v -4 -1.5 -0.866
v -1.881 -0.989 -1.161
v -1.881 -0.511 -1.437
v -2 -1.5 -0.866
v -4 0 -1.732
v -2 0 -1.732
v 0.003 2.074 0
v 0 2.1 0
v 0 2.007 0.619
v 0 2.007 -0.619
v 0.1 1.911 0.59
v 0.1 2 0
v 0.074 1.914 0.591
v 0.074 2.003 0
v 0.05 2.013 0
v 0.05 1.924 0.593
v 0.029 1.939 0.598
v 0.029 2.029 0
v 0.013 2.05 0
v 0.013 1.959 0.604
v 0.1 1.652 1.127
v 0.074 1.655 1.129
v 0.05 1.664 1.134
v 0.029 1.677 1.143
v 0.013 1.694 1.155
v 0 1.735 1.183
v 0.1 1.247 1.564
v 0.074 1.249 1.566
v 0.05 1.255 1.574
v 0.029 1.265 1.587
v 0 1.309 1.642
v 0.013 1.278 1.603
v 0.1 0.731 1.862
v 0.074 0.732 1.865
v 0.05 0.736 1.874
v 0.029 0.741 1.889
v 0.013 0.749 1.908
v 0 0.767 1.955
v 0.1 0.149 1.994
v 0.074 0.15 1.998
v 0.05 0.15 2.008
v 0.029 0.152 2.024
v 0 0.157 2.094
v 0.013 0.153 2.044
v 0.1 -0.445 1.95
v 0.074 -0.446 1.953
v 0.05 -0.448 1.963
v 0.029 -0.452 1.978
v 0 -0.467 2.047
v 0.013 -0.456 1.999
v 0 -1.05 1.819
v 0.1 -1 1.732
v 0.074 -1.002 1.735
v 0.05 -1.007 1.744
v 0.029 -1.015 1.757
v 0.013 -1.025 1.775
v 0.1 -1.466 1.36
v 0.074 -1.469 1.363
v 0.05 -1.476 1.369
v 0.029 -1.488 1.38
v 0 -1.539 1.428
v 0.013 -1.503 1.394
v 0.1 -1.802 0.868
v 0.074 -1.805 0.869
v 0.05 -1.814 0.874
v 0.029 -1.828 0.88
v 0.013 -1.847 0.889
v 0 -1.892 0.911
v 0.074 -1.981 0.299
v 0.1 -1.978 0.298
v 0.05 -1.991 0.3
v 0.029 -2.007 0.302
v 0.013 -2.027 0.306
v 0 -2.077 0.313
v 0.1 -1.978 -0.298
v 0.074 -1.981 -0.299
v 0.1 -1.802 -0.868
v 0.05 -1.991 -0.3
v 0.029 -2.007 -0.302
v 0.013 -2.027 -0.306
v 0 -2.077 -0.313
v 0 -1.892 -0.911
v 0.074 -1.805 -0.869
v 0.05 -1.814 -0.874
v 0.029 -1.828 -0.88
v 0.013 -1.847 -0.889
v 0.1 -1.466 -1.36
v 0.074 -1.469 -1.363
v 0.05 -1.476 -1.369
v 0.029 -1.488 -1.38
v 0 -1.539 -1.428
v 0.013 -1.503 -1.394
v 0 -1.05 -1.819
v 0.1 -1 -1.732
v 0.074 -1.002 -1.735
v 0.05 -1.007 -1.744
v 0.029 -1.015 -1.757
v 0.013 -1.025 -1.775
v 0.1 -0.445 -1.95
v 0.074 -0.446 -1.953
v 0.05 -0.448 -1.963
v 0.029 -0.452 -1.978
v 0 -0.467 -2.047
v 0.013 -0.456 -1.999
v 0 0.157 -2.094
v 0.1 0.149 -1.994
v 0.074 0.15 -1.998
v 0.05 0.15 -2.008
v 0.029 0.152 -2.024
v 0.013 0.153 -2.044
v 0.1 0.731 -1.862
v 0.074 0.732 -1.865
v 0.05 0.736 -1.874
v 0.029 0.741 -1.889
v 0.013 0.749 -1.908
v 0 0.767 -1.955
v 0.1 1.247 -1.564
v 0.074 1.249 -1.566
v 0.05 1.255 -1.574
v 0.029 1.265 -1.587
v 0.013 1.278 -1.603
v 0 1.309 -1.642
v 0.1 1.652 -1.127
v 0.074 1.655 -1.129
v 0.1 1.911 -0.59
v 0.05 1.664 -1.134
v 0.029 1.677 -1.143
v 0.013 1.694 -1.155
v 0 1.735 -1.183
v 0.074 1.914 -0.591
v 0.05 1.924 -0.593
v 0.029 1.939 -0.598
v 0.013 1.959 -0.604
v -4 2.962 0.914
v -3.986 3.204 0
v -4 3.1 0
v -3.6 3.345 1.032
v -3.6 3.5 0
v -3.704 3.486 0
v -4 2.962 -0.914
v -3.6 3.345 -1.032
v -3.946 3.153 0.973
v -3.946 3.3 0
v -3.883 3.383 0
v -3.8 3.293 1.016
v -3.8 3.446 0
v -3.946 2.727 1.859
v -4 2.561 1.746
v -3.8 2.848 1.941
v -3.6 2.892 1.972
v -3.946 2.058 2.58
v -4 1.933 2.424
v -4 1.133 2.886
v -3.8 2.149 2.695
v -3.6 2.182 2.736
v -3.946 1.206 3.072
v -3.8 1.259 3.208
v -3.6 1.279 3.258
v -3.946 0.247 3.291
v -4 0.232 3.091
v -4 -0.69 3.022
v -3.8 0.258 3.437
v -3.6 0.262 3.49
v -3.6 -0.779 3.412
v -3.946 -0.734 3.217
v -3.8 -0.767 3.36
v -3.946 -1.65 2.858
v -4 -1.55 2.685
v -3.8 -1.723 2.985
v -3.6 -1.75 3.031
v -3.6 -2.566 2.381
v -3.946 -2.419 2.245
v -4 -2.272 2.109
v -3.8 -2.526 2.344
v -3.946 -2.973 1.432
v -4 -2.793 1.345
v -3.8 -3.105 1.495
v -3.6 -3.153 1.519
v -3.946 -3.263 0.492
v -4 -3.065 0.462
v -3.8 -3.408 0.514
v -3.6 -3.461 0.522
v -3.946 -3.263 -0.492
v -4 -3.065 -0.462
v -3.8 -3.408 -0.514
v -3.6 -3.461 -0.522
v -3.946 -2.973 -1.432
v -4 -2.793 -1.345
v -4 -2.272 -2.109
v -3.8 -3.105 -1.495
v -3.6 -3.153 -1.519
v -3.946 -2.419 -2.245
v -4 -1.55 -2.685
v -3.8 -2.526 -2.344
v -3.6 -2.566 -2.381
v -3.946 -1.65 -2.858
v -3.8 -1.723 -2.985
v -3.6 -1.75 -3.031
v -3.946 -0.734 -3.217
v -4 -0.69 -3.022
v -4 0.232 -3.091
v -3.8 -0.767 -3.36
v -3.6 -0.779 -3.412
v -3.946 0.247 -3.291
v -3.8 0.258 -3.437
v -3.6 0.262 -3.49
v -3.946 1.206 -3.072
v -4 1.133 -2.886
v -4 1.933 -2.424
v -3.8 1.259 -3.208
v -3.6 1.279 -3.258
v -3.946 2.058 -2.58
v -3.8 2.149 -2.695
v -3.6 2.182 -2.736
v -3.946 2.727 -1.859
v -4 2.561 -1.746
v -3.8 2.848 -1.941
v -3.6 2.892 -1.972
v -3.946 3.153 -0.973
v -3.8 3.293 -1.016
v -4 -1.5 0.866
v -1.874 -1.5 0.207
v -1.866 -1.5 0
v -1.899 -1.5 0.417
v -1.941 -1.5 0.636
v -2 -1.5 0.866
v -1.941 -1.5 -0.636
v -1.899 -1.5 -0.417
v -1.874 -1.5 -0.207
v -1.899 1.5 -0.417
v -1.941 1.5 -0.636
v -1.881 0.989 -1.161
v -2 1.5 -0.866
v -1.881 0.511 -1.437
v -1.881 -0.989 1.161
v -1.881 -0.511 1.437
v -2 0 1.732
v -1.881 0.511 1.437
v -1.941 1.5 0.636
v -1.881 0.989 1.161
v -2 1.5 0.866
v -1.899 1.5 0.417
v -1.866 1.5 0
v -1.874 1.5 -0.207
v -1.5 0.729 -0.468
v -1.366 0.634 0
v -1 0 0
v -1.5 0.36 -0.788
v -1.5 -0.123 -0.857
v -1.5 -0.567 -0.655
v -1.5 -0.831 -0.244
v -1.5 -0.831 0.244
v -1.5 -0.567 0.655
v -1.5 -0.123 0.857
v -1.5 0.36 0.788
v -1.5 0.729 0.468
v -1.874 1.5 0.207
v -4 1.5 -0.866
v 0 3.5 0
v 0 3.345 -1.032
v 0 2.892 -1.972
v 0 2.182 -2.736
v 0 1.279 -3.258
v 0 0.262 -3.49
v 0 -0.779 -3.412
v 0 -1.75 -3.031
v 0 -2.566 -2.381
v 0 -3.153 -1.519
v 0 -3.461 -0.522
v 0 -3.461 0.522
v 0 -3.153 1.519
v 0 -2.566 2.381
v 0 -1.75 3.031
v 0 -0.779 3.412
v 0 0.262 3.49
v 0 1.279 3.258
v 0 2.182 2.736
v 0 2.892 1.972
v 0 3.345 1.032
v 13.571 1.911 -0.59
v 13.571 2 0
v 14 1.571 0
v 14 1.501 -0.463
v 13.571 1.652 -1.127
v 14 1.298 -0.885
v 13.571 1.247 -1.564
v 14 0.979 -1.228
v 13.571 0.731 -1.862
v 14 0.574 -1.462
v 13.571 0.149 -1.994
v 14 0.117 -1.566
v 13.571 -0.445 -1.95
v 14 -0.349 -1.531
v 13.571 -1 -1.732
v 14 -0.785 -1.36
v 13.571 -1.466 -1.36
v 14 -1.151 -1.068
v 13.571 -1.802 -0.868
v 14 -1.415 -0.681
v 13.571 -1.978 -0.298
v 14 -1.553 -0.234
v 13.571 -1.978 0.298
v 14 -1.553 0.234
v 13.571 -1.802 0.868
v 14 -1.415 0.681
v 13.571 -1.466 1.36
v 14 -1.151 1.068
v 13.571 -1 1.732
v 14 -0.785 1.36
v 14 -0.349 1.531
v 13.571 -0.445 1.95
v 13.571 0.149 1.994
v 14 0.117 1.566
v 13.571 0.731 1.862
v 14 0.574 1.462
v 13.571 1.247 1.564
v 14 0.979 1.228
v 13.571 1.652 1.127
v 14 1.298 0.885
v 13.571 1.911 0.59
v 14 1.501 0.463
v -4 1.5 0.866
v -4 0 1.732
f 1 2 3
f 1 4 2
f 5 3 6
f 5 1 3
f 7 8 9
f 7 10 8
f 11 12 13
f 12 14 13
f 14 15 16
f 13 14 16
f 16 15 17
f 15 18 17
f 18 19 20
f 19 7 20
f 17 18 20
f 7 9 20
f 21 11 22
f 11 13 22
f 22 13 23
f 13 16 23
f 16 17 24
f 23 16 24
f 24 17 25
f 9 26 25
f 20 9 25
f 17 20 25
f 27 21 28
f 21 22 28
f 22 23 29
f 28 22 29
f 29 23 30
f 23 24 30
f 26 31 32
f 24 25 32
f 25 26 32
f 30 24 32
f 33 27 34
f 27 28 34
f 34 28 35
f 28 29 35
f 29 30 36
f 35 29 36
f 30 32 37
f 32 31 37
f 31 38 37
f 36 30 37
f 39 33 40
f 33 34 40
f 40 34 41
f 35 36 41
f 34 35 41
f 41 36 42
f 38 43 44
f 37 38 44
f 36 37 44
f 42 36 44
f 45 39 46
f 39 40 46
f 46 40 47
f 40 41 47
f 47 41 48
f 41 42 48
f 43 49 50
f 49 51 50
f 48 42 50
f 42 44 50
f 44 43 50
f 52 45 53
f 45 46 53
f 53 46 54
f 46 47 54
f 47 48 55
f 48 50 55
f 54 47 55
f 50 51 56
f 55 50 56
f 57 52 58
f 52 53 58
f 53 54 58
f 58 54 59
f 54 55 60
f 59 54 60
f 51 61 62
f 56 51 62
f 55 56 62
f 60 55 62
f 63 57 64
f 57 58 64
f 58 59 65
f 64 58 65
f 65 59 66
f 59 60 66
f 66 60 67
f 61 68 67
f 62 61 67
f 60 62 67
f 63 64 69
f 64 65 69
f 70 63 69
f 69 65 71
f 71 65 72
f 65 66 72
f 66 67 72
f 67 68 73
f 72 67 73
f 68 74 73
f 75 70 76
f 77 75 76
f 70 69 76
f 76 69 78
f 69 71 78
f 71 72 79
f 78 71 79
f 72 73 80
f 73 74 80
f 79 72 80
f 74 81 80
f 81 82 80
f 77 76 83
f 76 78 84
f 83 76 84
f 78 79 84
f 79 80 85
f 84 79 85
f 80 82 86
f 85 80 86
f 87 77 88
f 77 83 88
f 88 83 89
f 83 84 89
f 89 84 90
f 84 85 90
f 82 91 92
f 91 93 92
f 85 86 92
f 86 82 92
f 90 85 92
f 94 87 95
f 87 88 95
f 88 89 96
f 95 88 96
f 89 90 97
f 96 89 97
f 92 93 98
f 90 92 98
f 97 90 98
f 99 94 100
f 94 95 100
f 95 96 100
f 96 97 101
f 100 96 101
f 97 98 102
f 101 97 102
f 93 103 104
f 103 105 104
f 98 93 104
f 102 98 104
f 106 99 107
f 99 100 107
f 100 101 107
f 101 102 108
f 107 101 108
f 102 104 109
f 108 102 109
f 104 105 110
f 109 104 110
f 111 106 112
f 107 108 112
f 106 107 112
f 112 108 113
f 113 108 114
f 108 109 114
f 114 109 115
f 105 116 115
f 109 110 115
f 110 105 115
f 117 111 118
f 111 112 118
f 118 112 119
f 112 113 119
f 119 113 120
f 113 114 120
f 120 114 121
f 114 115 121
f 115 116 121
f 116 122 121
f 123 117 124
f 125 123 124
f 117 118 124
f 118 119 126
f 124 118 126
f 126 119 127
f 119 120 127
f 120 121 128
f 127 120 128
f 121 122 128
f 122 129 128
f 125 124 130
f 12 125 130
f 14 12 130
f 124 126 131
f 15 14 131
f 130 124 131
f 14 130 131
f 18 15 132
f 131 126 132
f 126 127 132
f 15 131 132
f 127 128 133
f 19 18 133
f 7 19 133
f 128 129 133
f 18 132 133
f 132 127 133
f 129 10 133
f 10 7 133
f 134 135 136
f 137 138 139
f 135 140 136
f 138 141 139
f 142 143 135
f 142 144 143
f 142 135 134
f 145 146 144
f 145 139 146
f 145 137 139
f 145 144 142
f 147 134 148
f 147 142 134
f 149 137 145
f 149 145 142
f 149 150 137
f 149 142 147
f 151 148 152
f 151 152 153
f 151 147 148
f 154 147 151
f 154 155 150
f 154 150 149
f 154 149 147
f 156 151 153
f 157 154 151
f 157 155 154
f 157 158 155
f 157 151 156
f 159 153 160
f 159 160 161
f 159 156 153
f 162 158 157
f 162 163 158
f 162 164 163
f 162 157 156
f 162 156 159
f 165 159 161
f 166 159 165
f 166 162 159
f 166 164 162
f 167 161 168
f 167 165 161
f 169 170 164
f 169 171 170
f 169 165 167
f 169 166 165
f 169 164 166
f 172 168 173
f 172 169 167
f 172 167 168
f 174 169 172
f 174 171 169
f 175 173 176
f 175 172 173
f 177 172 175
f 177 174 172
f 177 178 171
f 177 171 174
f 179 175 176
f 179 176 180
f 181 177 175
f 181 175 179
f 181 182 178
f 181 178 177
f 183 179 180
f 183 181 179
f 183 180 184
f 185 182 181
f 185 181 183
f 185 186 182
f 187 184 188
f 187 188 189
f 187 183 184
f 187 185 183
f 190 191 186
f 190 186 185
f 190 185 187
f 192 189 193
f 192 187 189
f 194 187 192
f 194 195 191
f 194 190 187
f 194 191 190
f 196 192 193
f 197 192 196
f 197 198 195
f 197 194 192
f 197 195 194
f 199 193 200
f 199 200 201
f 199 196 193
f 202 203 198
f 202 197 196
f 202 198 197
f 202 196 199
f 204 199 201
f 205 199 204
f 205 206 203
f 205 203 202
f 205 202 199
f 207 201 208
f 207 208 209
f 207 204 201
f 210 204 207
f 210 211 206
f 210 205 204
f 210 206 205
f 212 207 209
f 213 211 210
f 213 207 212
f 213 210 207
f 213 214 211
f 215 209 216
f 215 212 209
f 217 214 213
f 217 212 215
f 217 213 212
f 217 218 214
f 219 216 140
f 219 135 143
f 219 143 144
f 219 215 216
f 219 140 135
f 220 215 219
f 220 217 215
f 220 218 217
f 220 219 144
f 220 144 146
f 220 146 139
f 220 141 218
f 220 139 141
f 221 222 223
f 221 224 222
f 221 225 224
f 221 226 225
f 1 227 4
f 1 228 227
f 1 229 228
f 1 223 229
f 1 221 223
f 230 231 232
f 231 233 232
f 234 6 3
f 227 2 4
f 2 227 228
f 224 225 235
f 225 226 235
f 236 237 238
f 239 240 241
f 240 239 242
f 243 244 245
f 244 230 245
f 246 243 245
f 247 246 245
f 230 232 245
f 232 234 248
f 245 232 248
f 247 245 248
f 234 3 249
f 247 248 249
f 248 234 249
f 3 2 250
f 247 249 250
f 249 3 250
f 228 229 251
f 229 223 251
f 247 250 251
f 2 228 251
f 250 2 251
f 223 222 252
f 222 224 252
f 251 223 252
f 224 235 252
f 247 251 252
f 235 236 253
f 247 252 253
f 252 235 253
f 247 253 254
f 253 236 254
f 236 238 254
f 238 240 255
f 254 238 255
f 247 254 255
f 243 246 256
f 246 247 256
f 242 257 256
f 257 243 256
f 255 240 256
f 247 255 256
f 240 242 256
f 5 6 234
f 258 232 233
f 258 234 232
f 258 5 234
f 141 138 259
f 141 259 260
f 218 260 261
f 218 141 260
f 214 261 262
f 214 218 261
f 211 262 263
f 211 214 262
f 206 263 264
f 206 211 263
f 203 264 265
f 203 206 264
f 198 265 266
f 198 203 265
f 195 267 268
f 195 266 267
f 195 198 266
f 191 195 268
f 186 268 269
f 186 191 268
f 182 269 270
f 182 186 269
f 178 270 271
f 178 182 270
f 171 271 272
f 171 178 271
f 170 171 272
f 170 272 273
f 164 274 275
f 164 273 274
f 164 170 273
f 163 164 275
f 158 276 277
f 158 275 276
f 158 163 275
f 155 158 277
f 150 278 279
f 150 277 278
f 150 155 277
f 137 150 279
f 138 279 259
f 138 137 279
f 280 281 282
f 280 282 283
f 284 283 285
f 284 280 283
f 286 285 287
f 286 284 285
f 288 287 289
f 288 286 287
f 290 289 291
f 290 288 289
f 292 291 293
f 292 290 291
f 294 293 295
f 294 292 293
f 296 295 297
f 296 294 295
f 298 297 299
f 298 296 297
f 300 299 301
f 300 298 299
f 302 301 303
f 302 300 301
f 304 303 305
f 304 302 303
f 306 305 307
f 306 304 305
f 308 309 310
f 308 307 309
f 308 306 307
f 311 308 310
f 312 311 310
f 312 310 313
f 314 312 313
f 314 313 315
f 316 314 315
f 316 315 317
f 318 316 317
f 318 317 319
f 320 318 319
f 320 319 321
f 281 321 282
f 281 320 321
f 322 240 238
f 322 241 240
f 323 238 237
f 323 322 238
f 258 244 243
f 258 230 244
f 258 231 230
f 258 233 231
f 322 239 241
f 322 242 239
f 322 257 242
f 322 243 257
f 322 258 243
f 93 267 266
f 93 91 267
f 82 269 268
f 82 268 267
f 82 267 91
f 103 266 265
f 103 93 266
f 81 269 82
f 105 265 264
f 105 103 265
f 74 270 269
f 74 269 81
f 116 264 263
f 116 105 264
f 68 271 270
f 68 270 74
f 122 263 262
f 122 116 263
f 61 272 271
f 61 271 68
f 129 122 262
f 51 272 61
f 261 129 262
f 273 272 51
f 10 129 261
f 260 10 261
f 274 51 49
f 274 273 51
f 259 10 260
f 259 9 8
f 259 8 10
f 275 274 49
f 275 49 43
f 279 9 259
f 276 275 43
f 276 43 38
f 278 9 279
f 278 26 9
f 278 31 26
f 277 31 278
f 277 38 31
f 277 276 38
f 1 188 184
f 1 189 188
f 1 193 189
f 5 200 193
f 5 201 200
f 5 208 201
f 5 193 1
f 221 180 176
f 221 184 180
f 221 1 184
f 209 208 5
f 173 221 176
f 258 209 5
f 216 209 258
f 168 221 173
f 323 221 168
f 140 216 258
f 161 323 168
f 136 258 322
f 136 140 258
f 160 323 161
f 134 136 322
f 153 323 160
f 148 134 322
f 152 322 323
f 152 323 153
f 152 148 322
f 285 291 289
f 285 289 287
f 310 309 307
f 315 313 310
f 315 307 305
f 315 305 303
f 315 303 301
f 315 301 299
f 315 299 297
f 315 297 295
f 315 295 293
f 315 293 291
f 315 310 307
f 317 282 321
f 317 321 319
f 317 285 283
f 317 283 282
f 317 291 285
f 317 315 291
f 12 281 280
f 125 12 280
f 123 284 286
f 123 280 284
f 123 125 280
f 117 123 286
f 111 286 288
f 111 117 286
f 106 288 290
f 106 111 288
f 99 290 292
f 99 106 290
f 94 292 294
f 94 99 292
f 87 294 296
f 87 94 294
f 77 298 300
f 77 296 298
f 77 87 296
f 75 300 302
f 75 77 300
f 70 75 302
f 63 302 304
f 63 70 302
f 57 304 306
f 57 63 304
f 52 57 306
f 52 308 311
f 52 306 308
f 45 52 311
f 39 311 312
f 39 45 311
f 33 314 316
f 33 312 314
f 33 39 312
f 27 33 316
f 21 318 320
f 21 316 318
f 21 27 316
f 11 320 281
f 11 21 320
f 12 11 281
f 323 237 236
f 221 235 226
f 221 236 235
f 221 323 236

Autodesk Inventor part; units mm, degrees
ref_plane "YZ Plane" through (0, 0, 0) normal (1, 0, 0) x (0, 1, 0)
ref_plane "XZ Plane" through (0, 0, 0) normal (0, 1, 0) x (-1, 0, 0)
sketch "Sketch1" plane through (0, 0, 0) normal (0, 0, 1) x (1, 0, 0)
  line L0 (-1, 0) -> (14, 0)
  line L1 (14, 0) -> (14, 2)
  line L2 (14, 2) -> (1.75, 2)
  line L3 (1.75, 2) -> (1.3205, 2)
  line L4 (1.3205, 2) -> (0, 2)
  line L5 (0, 2) -> (0, 3.5)
  line L6 (0, 3.5) -> (-4, 3.5)
  line L7 (-4, 3.5) -> (-4, 1.7321)
  line L8 (-4, 1.7321) -> (-2, 1.7321)
  line L9 (-2, 1.7321) -> (-1, 0)
  line L10 (-7.6, 0) -> (17.6, 0) projected
  line L11 (0, -0.7) -> (0, 4.2) projected
  line L12 (1.75, 2) -> (0, 2) construction
  dimension "d1" = 12.25
  dimension "d2" = 0.4295
  dimension "d3" = 4
  dimension "d4" = 2
  dimension "d5" = 60
  dimension "d6" = 4
  dimension "d7" = 4
  dimension "d8" = 3.4641
  dimension "d9" = 7
  dimension "d26" = 14
revolve "Body" add sketch "Sketch1" angle 360 about axis through (-1, 0, 0) along (1, 0, 0)
sketch "Sketch2" plane through (-4, 0, 0) normal (-1, 0, 0) x (0, 0, 1)
  circle A0 centre (0, 0) radius 1.7321 projected
  line L0 (0, -4.9) -> (0, 4.9) projected
  line L1 (-4.9, 0) -> (4.9, 0) projected
  line L2 (1.7321, 0) -> (0.866, -1.5)
  line L3 (0.866, -1.5) -> (-0.866, -1.5)
  line L4 (-0.866, -1.5) -> (-1.7321, 0)
  line L5 (-1.7321, 0) -> (-0.866, 1.5)
  line L6 (-0.866, 1.5) -> (0.866, 1.5)
  line L7 (0.866, 1.5) -> (1.7321, 0)
extrude "Slot" add sketch "Sketch2" against normal up to next contours L7 A0 | A0 L2 | L6 L0 A0 | A0 L0 L3 | L0 L6 A0 | A0 L3 L0 | L4 A0 | A0 L5
fillet "Fillet1" radius 0.4 1 edges at (-4, -3.5, 0)
thread "Thread" size "M4x0.7" class "6g" standard "ISO Metric profile" length 12.25
chamfer "Chamfer1" distance 0.4294 distance2 0.4294 1 edges at (14, -2, 0) measured on face at (14, 0.527, -0.2661)
ref_plane "Work Plane1" through (29, 0, 0) normal (0, -1, 0) x (1, 0, 0)
fillet "Fillet2" radius 0.1 1 edges at (0, -2, 0)
equation "\"d1\" = GEL"
equation "\"d3\" = KOH"
equation "\"d4\" = INTI"
equation "\"d6\" = GD"
equation "\"d7\" = BDM"
equation "\"d8\" = 1.1547 * SW"
equation "\"d9\" = KOD"
equation "\"d26\" = NLG"
equation "\"d30\" = R"
equation "\"d17\" = RR"
equation "\"d13\" = GEL"
equation "\"d15\" = -0.5 * SPD + 0.5 * GD"
equation "\"d16\" = GUL"
equation "\"GD\" = NND"
equation "\"NLG\" = 14"
equation "\"GEL\" = 12.25"
equation "\"KOD\" = 7"
equation "\"KOH\" = NND"
equation "\"INTI\" = 2"
equation "\"GAL\" = 0.61345 * PTC"
equation "\"GUL\" = 0.61345 * PTC"
equation "\"BDM\" = NND"
equation "\"SW\" = 3"
equation "\"RR\" = 0.1 * NND"
equation "\"SPD\" = NND - 1.2269 * PTC"
equation "\"R\" = 0.1"
equation "\"PHH\" = 0.13"
equation "\"GD1\" = THREADDIA - 1.2269 * PTC"
equation "\"THREADDIA\" = 4"
equation "\"FAWI\" = 45deg"
equation "\"PTC\" = 0.7"
equation "\"KOH1\" = 3.6"
equation "\"NND\" = 4"
equation "\"TOA\" = 30deg"
equation "\"E0\" = 1.155 * SW"
properties part number "AS 1420 - 1973 - M4 x 14" material "Steel, Mild"
